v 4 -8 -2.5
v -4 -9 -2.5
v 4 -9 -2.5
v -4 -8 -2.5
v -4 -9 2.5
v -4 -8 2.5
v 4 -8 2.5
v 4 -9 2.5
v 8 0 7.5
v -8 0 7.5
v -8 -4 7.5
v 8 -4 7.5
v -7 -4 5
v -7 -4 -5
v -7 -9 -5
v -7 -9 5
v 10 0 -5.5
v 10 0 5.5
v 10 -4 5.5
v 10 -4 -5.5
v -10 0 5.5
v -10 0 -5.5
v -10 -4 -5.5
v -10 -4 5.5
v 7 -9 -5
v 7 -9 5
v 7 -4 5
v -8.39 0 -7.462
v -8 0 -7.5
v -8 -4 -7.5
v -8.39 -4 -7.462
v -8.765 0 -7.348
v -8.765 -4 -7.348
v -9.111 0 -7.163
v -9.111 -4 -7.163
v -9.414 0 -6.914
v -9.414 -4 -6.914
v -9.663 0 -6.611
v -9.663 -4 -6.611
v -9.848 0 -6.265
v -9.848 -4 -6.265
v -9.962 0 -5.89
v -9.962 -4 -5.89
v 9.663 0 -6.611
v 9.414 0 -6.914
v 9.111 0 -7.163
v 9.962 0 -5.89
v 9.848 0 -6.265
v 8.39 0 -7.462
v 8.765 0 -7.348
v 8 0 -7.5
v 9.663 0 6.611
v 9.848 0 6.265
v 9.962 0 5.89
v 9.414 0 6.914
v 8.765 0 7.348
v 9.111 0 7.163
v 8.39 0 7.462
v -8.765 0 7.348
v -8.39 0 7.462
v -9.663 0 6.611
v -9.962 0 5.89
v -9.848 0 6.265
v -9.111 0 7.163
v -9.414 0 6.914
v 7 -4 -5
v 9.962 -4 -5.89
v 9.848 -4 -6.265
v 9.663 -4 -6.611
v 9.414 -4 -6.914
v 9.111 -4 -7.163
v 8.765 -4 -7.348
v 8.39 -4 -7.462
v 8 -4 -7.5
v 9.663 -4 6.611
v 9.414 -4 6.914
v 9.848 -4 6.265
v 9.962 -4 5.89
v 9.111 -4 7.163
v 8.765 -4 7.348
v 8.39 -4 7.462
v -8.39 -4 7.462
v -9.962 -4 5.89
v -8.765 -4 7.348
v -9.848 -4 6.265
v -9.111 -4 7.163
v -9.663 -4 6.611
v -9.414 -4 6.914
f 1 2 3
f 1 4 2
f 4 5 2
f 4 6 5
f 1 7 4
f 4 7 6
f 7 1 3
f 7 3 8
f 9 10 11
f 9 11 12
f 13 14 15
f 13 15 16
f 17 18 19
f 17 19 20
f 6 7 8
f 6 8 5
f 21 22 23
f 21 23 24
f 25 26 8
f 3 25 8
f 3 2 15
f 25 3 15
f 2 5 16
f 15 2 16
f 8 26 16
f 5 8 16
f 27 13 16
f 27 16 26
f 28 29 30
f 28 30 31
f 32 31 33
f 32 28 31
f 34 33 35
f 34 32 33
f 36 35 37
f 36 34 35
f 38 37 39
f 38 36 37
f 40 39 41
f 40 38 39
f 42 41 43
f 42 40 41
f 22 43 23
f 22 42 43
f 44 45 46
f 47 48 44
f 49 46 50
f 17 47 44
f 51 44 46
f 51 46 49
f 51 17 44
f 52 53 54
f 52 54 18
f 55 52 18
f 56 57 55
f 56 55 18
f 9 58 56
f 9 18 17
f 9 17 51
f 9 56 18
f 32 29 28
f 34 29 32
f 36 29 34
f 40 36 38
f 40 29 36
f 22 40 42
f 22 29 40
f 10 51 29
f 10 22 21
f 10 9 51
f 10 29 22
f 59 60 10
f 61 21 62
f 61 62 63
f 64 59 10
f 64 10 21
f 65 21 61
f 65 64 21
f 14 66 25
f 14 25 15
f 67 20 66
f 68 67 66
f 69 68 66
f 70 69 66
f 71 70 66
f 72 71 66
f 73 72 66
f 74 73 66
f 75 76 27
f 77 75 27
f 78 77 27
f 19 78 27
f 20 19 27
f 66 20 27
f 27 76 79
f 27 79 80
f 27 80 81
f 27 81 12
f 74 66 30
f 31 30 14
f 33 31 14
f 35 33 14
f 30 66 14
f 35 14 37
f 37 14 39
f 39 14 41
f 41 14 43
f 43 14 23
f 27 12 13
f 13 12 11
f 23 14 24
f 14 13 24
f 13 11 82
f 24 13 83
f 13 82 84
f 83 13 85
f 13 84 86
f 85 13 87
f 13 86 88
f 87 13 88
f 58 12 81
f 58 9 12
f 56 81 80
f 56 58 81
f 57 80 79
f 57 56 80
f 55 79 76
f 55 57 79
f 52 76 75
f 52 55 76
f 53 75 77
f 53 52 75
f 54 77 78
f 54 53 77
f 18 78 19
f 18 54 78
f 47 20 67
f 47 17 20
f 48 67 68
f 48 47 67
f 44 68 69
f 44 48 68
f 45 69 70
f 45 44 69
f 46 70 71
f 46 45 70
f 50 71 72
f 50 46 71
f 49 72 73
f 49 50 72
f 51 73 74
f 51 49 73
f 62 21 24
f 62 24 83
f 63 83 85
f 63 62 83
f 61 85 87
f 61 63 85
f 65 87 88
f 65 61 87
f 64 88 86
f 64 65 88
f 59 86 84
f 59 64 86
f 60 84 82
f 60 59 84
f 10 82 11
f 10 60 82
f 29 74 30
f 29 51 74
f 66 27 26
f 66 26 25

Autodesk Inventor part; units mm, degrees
ref_plane "YZ Plane" through (0, 0, 0) normal (1, 0, 0) x (0, 1, 0)
ref_plane "XZ Plane" through (0, 0, 0) normal (0, 1, 0) x (-1, 0, 0)
ref_plane "XY Plane" through (0, 0, 0) normal (0, 0, 1) x (1, 0, 0)
sketch "Sketch1" plane through (0, 0, 0) normal (0, 1, 0) x (-1, 0, 0)
  line L0 (-14.5799, 0) -> (14.5799, 0) projected
  line L1 (7, 5) -> (-7, 5)
  line L2 (-7, 5) -> (-7, -5)
  line L3 (-7, -5) -> (7, -5)
  line L4 (7, -5) -> (7, 5)
  line L5 (8, 7.5) -> (-8, 7.5)
  line L6 (-10, 5.5) -> (-10, -5.5)
  line L7 (-8, -7.5) -> (8, -7.5)
  line L8 (10, -5.5) -> (10, 5.5)
  line L9 (0, -11.0799) -> (0, 11.0799) projected
  arc A0 (10, 5.5) -> (8, 7.5) centre (8, 5.5) ccw
  arc A1 (8, -7.5) -> (10, -5.5) centre (8, -5.5) ccw
  arc A2 (-10, -5.5) -> (-8, -7.5) centre (-8, -5.5) ccw
  arc A3 (-8, 7.5) -> (-10, 5.5) centre (-8, 5.5) ccw
  line L10 (-4, 2.5) -> (4, 2.5)
  line L11 (4, 2.5) -> (4, -2.5)
  line L12 (4, -2.5) -> (-4, -2.5)
  line L13 (-4, -2.5) -> (-4, 2.5)
  point P0 (0, 0)
  point P1 (10, 7.5)
  point P2 (10, -7.5)
  dimension "d0" = 10
  dimension "d1" = 15
  dimension "d2" = 14
  dimension "d3" = 20
  dimension "d4" = 2
  dimension "d9" = 5
  dimension "d10" = 8
extrude "Extrusion1" add sketch "Sketch1" against normal blind 4 contours L6 A3 L5 L9 L1 L2 L0 | L0 L2 L3 L9 L7 A2 L6 | L9 L5 A0 L8 L0 L4 L1 | L3 L4 L0 L8 A1 L7 L9
extrude "Extrusion3" add sketch "Sketch1" against normal blind 8 contours L13 L10 L9 L0 | L0 L9 L12 L13 | L9 L10 L11 L0 | L0 L11 L12 L9
extrude "Extrusion4" add sketch "Sketch1" against normal blind 9 contours L2 L1 L9 L10 L13 L0 | L0 L13 L12 L9 L3 L2 | L1 L4 L0 L11 L10 L9 | L9 L12 L11 L0 L4 L3
properties part number "slab"
